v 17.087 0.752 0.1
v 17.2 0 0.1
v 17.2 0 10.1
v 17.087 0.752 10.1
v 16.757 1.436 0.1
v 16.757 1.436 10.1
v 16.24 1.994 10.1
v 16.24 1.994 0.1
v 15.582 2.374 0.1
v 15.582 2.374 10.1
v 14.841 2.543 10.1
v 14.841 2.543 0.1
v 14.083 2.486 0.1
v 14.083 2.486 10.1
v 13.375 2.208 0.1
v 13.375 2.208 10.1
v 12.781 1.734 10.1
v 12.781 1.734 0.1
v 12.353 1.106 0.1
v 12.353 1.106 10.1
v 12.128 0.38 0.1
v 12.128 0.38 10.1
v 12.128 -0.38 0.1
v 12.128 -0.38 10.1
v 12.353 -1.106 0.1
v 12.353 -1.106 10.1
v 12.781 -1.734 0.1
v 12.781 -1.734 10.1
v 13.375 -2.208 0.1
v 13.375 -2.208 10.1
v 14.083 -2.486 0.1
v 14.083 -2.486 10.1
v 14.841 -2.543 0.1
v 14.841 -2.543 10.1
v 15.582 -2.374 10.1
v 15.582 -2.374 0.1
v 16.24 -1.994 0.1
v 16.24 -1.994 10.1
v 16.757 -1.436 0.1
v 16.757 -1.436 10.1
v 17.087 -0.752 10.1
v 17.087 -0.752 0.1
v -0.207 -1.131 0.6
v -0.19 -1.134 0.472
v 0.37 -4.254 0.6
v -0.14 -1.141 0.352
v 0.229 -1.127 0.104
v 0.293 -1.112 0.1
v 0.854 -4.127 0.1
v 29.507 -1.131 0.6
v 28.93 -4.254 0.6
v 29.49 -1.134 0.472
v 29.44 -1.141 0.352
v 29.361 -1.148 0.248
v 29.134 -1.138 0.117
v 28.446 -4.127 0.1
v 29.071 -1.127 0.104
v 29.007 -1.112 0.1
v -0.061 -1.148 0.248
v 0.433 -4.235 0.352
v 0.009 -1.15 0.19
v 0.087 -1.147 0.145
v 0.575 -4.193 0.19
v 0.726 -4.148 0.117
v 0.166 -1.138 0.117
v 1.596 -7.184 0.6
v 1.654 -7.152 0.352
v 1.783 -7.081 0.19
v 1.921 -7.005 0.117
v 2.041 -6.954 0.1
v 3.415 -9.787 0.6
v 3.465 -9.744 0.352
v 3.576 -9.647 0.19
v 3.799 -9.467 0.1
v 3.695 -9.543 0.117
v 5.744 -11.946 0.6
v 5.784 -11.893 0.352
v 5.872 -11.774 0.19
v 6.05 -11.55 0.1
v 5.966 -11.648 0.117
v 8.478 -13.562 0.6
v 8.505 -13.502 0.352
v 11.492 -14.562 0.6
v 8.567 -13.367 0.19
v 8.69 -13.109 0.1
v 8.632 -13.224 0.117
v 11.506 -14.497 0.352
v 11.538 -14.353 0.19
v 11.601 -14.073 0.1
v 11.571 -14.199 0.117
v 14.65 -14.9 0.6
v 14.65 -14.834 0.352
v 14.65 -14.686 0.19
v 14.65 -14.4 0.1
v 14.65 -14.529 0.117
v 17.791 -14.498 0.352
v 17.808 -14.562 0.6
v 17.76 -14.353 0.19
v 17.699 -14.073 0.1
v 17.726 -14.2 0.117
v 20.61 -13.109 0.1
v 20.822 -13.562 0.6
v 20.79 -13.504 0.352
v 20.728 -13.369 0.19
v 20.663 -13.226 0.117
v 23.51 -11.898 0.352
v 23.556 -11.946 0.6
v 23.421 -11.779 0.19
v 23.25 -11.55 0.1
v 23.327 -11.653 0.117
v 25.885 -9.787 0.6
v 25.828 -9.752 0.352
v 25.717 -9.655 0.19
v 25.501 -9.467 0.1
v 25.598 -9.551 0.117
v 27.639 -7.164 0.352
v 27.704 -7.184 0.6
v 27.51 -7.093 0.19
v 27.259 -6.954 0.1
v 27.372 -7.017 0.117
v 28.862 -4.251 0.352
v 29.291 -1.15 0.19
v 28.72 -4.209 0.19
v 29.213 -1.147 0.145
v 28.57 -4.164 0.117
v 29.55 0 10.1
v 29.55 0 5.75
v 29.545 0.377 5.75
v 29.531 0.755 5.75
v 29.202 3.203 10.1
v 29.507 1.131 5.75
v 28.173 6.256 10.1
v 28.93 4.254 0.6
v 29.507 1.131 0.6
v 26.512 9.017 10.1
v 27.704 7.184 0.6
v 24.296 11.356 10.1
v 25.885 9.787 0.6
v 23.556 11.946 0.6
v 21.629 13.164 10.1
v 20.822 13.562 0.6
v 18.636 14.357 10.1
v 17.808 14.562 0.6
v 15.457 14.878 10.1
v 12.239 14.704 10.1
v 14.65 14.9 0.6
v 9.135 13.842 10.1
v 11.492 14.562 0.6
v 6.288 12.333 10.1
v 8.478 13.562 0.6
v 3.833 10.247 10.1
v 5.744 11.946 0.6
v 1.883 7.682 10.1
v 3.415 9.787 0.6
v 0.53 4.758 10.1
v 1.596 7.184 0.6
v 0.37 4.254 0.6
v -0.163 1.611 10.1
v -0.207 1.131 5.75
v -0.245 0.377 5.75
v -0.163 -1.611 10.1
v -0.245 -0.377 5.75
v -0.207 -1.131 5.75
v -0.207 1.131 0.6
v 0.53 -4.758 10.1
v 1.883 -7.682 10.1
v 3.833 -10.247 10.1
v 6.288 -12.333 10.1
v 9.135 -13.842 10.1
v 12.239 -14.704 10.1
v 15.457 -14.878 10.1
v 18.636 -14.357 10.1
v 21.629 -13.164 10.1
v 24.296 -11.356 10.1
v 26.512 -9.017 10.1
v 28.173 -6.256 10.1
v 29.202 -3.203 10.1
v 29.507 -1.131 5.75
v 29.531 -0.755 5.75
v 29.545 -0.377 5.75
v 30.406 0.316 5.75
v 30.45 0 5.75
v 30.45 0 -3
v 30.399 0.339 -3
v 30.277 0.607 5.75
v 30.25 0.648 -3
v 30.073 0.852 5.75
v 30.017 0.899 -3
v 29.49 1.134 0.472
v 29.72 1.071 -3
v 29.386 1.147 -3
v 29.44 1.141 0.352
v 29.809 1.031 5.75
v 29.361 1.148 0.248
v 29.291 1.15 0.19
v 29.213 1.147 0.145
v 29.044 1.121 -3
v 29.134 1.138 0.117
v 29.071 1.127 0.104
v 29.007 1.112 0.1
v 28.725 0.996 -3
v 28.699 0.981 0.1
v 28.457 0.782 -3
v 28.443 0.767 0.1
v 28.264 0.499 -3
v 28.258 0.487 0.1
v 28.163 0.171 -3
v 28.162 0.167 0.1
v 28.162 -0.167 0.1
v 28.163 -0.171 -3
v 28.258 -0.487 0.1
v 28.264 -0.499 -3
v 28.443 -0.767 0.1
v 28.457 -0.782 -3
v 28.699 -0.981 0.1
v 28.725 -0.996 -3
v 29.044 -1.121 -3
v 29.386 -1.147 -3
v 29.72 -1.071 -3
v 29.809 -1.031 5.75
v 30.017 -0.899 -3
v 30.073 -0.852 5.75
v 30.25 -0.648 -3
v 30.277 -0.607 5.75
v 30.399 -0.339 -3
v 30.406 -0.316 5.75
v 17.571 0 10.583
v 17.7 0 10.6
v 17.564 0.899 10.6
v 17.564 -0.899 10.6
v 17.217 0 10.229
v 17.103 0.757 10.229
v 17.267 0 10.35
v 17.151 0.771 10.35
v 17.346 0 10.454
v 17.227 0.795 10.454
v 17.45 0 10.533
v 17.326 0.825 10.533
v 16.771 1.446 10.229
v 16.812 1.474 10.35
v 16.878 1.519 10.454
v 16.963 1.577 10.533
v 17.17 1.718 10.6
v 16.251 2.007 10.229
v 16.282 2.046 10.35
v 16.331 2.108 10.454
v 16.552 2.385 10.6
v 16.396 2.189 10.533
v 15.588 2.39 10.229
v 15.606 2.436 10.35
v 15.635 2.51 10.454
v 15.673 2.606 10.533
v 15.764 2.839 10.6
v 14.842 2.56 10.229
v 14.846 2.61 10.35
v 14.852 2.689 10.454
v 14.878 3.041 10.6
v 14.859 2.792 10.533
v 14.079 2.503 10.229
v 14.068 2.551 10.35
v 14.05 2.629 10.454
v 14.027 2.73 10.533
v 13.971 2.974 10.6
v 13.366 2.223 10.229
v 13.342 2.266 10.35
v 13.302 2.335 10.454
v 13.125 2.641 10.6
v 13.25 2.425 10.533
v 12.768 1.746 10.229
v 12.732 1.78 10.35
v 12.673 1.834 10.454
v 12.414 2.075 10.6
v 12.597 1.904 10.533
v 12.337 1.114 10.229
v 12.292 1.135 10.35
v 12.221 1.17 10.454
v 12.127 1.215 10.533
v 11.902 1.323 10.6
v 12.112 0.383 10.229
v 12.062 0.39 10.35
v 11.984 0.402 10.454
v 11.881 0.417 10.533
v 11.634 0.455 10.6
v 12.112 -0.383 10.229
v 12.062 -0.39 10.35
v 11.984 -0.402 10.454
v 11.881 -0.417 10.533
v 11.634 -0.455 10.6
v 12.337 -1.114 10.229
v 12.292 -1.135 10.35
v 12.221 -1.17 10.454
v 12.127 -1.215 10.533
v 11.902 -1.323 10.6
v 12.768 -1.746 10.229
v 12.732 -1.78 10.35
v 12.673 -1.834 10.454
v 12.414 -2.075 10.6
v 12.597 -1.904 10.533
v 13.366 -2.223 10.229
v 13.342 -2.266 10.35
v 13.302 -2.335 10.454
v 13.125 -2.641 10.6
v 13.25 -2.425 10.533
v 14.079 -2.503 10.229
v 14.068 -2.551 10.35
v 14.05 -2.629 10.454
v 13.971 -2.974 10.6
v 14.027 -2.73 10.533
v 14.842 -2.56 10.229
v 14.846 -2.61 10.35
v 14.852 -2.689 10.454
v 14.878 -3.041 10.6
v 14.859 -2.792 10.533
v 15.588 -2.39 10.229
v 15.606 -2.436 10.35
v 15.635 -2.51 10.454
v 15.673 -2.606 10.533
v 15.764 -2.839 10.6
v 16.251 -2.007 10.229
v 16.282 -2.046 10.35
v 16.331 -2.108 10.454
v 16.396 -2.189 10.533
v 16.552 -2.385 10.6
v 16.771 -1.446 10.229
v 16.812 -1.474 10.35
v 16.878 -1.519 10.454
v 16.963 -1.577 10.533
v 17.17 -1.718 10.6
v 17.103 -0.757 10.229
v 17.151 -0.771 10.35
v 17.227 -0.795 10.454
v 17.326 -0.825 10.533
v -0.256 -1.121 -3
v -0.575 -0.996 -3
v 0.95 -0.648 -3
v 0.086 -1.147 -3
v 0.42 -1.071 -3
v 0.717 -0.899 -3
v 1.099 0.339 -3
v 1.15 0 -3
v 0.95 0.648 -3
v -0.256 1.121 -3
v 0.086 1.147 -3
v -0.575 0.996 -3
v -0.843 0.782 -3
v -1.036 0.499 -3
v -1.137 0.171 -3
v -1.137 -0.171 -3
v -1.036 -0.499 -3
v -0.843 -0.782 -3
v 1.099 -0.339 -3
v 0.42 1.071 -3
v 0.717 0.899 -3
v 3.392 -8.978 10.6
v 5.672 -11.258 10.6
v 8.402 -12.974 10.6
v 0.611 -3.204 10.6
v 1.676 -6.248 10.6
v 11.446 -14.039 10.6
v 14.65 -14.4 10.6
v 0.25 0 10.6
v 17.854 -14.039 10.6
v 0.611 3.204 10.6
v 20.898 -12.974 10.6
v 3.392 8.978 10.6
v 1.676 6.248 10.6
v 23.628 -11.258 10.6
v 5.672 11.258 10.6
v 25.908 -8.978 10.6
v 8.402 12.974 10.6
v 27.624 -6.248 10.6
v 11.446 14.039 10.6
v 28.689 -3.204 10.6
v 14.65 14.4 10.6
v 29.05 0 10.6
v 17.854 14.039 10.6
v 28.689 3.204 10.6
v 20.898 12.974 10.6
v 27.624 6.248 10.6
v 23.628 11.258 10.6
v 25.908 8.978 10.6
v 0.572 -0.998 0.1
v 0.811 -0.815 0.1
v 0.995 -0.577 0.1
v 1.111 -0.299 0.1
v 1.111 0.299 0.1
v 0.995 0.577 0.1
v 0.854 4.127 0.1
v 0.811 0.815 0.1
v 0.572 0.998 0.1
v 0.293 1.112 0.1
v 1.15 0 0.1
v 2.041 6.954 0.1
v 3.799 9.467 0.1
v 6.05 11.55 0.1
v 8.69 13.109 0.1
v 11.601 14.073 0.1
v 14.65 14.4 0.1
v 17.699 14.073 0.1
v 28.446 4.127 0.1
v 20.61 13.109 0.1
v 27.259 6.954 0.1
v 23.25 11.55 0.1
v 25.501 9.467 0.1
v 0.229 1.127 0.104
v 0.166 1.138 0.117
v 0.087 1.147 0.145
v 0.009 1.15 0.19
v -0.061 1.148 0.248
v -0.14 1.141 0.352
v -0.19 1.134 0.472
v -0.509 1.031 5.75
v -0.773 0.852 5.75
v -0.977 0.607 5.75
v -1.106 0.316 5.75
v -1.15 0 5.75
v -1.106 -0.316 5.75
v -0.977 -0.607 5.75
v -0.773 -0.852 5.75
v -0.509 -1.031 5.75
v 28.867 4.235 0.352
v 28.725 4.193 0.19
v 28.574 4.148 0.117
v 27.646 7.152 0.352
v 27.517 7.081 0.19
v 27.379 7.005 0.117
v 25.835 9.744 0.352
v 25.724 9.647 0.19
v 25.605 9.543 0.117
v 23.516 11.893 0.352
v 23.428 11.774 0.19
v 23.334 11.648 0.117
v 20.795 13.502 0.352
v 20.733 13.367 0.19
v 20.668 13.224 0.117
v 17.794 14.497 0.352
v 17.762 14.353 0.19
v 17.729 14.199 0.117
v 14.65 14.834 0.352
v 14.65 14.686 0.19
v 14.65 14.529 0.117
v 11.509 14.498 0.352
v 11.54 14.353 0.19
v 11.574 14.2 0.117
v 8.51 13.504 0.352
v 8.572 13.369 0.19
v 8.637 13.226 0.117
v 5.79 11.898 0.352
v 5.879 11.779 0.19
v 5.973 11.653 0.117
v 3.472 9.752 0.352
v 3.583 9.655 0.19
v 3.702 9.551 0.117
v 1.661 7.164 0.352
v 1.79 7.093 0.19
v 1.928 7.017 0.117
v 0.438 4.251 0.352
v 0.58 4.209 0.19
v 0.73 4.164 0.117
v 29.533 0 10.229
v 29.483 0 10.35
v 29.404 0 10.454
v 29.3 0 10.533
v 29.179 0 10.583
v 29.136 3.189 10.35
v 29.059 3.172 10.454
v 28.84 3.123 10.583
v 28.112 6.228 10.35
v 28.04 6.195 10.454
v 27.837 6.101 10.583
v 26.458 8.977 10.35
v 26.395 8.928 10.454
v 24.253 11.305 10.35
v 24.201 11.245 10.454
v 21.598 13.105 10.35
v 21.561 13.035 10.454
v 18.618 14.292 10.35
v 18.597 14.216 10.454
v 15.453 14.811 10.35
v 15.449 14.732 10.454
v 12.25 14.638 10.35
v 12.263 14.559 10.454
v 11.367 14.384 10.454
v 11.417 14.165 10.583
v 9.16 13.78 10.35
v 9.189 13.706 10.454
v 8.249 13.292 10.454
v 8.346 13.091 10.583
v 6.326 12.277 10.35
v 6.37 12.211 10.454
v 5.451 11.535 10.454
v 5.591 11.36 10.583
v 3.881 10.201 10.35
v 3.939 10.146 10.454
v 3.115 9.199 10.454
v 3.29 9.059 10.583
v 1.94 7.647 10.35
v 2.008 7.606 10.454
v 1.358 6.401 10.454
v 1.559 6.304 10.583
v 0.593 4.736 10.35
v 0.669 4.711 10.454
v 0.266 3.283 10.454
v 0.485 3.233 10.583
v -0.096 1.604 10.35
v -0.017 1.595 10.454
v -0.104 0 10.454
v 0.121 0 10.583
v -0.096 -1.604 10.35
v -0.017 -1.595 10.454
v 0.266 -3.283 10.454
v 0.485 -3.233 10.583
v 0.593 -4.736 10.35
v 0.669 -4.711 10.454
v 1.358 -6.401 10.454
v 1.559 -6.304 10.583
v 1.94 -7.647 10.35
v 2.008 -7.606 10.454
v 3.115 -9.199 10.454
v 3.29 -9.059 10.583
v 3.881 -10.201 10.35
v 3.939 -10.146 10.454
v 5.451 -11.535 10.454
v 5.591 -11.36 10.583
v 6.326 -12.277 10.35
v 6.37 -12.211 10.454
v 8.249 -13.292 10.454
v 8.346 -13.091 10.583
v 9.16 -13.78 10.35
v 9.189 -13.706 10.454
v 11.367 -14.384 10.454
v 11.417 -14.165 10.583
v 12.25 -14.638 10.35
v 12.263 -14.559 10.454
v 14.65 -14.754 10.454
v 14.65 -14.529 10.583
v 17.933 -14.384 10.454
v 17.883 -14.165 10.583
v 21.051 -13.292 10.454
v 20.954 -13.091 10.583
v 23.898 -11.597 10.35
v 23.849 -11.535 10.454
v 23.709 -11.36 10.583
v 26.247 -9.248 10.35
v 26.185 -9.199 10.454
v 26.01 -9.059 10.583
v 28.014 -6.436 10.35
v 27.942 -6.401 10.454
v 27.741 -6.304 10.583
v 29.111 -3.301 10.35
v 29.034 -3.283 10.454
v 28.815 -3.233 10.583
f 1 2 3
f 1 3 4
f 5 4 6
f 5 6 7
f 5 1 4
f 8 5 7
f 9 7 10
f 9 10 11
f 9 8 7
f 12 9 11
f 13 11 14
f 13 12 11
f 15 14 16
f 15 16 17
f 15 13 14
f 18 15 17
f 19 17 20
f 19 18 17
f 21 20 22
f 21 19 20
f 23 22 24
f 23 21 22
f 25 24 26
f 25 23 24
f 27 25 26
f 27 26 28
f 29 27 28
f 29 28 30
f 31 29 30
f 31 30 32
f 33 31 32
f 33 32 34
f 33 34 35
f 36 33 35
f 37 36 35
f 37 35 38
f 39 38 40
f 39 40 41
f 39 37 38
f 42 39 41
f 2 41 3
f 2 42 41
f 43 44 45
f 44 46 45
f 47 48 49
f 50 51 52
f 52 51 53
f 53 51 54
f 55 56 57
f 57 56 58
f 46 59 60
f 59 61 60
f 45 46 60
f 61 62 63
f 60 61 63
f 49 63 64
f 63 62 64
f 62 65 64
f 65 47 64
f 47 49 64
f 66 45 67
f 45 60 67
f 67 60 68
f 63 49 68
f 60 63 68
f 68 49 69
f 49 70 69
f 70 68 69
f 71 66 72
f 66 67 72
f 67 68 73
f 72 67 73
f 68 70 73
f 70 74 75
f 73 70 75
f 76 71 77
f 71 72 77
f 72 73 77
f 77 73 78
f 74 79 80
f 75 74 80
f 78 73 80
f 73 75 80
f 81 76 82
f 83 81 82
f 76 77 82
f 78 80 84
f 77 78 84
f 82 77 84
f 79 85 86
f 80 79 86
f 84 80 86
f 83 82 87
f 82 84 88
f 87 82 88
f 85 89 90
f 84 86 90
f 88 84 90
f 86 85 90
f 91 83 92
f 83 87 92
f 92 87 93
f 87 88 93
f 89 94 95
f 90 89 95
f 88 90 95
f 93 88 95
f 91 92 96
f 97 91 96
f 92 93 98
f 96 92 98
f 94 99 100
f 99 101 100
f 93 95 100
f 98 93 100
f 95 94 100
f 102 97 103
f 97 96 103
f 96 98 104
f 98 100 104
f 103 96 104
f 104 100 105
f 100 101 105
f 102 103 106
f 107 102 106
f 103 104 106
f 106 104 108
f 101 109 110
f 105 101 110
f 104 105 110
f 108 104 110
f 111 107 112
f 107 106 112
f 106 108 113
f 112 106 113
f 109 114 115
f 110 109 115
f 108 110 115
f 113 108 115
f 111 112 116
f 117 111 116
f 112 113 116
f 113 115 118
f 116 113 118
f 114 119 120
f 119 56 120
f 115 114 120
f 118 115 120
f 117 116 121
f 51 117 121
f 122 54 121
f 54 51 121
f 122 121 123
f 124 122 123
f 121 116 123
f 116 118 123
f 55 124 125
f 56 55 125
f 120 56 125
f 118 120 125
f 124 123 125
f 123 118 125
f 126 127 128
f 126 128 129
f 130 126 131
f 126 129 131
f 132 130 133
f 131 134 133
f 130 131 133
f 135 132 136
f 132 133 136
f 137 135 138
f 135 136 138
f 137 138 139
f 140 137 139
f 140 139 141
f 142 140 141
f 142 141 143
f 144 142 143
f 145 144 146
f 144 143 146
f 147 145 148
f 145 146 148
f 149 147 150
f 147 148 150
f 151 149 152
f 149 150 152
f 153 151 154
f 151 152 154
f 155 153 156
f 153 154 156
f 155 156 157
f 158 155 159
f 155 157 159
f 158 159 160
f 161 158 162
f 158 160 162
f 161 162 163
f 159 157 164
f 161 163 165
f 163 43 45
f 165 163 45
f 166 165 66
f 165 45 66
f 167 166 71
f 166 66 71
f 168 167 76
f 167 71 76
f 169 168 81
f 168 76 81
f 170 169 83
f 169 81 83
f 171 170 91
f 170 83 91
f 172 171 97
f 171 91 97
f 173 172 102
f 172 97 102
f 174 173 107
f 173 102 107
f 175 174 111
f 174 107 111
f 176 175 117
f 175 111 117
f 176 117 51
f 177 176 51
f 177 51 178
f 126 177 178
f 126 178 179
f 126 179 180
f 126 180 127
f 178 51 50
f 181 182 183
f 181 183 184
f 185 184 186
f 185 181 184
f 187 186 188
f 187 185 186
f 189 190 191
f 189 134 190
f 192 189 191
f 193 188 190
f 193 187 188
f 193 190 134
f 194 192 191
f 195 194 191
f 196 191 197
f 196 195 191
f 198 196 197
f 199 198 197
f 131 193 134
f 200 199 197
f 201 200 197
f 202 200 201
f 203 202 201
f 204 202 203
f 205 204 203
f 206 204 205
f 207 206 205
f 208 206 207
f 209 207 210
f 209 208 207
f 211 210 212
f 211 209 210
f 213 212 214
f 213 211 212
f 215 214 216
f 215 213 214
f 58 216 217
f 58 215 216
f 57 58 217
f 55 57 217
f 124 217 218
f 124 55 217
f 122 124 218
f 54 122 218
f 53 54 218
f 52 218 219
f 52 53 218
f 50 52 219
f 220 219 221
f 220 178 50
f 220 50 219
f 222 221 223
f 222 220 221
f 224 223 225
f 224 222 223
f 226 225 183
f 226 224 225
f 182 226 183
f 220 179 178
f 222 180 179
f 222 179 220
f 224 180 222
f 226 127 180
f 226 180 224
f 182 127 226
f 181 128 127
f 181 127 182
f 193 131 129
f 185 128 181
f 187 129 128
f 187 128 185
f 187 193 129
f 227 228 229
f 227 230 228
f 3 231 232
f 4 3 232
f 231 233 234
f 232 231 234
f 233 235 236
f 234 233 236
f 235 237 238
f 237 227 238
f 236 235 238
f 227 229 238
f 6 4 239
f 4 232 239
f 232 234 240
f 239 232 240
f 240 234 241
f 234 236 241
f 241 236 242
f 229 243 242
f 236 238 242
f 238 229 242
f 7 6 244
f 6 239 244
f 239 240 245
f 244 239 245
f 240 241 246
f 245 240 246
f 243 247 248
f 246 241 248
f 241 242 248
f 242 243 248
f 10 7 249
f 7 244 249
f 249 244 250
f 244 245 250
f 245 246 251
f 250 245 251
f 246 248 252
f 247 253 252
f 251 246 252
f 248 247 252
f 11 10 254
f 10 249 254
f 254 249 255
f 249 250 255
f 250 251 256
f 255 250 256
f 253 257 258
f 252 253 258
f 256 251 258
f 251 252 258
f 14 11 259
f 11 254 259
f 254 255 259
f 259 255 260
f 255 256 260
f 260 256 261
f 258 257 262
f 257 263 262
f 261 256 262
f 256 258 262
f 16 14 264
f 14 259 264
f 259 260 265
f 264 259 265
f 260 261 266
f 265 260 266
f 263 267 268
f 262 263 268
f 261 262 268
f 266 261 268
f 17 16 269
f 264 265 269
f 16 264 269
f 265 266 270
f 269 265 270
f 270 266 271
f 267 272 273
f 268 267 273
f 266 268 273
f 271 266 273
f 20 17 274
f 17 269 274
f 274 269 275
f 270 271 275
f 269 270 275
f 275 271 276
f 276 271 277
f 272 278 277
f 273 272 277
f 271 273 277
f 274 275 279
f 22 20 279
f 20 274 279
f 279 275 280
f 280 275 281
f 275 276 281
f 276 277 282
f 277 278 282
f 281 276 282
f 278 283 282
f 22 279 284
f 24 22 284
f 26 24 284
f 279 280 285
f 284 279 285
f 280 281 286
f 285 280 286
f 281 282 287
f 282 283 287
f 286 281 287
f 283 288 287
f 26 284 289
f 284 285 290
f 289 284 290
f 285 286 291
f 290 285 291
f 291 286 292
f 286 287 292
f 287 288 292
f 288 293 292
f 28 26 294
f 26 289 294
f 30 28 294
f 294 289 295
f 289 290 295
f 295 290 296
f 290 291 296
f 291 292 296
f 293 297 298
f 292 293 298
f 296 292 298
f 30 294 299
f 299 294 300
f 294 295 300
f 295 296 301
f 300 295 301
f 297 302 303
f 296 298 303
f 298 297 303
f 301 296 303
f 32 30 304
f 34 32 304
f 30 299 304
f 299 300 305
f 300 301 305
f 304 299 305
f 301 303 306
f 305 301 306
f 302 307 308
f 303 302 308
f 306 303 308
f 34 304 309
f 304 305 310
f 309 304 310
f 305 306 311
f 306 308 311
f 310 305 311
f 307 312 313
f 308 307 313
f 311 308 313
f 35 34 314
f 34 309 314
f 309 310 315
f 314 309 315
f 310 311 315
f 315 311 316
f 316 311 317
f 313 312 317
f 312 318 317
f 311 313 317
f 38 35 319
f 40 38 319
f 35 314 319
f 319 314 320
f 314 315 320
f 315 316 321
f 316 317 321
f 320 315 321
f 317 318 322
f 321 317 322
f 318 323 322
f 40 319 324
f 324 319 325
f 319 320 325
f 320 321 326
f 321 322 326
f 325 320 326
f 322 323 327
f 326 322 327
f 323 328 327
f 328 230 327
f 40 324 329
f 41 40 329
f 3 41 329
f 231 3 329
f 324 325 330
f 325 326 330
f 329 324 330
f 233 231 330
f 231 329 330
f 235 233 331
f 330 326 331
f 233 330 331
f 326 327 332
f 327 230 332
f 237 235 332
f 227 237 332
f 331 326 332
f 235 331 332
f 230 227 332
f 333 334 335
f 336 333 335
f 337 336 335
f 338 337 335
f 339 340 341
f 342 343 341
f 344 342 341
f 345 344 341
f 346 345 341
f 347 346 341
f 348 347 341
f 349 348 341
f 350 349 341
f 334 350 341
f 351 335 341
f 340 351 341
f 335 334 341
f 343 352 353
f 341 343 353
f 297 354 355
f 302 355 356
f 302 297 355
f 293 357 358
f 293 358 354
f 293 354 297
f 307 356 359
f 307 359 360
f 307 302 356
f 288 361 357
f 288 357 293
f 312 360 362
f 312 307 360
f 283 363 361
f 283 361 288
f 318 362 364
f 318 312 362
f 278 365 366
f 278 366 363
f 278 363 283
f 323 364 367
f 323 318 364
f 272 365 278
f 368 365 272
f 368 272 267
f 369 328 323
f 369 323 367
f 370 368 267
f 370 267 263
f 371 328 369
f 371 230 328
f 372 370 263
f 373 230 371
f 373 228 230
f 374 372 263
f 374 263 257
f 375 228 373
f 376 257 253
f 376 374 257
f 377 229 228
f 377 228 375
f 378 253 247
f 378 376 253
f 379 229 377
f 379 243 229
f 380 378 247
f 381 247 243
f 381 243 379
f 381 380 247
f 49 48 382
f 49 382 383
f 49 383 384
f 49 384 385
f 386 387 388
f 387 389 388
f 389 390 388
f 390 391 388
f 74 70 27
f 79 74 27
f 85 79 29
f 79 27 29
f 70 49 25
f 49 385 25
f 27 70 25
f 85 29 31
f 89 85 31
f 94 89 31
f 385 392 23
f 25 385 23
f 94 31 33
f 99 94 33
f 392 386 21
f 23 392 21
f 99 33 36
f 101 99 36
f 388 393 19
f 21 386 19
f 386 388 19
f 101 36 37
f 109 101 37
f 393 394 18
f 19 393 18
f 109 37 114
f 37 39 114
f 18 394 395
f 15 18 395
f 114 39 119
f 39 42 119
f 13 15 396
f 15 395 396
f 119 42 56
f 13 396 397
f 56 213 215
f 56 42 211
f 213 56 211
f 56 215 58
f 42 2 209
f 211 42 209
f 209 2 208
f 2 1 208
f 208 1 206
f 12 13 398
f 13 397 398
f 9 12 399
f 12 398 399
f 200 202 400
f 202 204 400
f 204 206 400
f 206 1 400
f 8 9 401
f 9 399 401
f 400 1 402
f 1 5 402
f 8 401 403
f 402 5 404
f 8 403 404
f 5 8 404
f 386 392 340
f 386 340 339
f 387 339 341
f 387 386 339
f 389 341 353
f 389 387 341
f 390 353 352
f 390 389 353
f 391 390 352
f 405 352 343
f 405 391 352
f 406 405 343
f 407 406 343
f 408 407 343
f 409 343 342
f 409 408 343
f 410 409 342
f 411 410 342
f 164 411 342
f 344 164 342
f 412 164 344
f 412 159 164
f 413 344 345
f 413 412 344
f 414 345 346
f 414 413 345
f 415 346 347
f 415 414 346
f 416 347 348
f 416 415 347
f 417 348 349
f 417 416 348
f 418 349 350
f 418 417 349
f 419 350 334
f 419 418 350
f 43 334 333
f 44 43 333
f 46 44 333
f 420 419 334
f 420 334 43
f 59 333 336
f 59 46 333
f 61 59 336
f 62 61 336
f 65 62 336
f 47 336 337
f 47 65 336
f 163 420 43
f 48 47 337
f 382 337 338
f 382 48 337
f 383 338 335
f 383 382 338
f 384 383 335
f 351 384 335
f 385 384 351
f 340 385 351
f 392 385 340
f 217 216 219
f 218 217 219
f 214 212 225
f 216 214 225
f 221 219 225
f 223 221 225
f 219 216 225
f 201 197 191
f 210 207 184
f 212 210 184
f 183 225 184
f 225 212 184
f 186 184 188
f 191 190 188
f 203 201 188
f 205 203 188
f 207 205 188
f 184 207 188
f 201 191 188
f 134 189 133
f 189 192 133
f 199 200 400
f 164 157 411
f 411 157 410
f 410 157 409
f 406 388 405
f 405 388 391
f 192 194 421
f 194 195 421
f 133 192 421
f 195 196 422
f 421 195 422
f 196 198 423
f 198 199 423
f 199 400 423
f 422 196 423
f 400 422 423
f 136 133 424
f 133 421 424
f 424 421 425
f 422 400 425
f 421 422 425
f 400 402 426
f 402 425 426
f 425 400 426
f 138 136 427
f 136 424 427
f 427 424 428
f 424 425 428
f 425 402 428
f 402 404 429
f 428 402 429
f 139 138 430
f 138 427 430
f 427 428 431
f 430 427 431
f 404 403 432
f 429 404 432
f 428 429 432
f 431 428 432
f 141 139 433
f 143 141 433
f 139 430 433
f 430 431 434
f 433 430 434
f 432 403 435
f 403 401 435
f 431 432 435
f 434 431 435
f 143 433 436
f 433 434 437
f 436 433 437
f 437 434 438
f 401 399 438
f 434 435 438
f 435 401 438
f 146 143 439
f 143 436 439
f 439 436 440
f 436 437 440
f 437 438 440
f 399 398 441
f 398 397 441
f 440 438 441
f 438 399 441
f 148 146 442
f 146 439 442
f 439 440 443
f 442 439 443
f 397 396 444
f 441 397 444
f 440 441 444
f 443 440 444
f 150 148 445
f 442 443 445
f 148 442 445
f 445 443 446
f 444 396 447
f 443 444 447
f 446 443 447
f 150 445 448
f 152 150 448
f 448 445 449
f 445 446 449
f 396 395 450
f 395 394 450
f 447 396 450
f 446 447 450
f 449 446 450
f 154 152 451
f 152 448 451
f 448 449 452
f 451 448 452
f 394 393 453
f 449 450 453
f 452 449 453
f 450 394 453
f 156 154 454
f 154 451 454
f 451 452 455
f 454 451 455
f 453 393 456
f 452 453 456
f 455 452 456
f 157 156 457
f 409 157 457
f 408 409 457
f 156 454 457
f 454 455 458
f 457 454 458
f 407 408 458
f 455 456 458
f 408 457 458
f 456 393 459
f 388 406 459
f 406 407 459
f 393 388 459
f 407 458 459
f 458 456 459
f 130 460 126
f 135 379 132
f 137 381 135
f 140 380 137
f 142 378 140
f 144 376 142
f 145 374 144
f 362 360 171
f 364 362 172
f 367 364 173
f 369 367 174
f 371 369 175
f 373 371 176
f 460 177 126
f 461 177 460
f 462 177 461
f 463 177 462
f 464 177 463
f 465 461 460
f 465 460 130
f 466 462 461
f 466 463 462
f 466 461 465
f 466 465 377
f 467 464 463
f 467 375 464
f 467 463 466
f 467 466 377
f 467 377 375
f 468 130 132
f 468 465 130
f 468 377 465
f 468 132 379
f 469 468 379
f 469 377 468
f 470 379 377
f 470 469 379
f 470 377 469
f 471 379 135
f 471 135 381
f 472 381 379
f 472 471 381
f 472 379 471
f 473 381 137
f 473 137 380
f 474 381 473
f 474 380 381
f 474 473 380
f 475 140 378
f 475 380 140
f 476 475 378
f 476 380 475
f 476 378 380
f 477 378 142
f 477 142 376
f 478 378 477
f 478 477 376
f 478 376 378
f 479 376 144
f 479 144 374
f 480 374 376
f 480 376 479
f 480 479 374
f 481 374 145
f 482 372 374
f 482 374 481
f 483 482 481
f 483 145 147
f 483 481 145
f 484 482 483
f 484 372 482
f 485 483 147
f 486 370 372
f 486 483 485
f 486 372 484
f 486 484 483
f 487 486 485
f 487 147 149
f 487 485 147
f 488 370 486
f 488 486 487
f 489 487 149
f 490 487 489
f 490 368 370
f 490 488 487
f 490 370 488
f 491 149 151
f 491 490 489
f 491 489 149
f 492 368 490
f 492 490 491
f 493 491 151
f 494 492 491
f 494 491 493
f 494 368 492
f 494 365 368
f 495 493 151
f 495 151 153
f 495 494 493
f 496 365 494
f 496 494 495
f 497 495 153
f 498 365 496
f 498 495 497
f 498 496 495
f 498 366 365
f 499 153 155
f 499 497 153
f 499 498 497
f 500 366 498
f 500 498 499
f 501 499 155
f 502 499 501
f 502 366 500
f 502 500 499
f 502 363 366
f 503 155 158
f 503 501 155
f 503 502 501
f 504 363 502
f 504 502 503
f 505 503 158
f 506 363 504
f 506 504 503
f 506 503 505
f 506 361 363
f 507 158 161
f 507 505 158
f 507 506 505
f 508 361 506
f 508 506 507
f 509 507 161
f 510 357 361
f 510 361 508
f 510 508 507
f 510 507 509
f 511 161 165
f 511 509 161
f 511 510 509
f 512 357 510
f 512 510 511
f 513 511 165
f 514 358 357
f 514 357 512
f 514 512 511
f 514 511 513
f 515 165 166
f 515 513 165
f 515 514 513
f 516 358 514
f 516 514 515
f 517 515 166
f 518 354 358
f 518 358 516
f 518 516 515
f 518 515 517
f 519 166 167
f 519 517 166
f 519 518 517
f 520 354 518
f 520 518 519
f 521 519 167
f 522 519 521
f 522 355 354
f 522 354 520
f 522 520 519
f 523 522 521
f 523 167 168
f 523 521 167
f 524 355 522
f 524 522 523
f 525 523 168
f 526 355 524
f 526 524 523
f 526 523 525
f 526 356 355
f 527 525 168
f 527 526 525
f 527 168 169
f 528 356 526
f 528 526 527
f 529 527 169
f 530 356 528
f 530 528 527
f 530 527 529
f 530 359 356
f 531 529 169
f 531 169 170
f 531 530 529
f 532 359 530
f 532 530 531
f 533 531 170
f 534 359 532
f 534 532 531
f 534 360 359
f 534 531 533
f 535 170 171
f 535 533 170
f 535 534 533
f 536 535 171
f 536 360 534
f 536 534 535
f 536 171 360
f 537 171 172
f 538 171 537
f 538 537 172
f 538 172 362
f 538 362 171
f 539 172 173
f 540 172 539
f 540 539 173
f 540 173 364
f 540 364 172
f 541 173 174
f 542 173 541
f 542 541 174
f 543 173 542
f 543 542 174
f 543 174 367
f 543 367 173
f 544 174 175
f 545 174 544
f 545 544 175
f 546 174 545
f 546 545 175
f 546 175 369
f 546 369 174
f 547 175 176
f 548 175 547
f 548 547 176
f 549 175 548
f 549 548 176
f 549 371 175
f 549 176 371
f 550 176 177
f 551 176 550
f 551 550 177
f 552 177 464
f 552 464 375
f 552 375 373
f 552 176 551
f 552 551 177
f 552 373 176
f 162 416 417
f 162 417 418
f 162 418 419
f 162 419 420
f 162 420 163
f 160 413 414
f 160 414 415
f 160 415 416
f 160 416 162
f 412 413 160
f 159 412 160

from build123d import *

# Parameters (mm, degrees)
SKETCH001_R       = 1.15
PAD001_DEPTH      = 5.25
PAD001_DEPTH_BACK = 3.5
SKETCH_R          = 14.9
SKETCH_R_2        = 2.55
PAD_DEPTH         = 10.5
FILLET_R          = 0.5


with BuildPart() as pad001:
    # Sketch001 → Pad001 (new body, two sides)
    with BuildSketch(Plane.XY.offset(0.5)) as pad001_sk:
        Circle(SKETCH001_R)
        with Locations((29.3, 0)):
            Circle(SKETCH001_R)
    extrude(amount=PAD001_DEPTH)
    extrude(pad001_sk.sketch, amount=-PAD001_DEPTH_BACK)


with BuildPart() as fillet_mp_cp:
    # Sketch → Pad (new body)
    with BuildSketch(Plane.XY.offset(0.1)):
        with Locations((14.65, 0)):
            Circle(SKETCH_R)
        with Locations((14.65, 0)):
            Circle(SKETCH_R_2, mode=Mode.SUBTRACT)
    extrude(amount=PAD_DEPTH)

    # Fillet
    fillet_edges = [fillet_mp_cp.edges().sort_by_distance(p)[0] for p in [
        (12.1, 0, 10.6),
        (-0.25, 0, 10.6),
        (-0.25, 0, 0.1),
    ]]
    fillet(fillet_edges, radius=FILLET_R)

    # Fillet_mp_cp: union Pad001
    add(pad001.part)


solid = fillet_mp_cp.part
